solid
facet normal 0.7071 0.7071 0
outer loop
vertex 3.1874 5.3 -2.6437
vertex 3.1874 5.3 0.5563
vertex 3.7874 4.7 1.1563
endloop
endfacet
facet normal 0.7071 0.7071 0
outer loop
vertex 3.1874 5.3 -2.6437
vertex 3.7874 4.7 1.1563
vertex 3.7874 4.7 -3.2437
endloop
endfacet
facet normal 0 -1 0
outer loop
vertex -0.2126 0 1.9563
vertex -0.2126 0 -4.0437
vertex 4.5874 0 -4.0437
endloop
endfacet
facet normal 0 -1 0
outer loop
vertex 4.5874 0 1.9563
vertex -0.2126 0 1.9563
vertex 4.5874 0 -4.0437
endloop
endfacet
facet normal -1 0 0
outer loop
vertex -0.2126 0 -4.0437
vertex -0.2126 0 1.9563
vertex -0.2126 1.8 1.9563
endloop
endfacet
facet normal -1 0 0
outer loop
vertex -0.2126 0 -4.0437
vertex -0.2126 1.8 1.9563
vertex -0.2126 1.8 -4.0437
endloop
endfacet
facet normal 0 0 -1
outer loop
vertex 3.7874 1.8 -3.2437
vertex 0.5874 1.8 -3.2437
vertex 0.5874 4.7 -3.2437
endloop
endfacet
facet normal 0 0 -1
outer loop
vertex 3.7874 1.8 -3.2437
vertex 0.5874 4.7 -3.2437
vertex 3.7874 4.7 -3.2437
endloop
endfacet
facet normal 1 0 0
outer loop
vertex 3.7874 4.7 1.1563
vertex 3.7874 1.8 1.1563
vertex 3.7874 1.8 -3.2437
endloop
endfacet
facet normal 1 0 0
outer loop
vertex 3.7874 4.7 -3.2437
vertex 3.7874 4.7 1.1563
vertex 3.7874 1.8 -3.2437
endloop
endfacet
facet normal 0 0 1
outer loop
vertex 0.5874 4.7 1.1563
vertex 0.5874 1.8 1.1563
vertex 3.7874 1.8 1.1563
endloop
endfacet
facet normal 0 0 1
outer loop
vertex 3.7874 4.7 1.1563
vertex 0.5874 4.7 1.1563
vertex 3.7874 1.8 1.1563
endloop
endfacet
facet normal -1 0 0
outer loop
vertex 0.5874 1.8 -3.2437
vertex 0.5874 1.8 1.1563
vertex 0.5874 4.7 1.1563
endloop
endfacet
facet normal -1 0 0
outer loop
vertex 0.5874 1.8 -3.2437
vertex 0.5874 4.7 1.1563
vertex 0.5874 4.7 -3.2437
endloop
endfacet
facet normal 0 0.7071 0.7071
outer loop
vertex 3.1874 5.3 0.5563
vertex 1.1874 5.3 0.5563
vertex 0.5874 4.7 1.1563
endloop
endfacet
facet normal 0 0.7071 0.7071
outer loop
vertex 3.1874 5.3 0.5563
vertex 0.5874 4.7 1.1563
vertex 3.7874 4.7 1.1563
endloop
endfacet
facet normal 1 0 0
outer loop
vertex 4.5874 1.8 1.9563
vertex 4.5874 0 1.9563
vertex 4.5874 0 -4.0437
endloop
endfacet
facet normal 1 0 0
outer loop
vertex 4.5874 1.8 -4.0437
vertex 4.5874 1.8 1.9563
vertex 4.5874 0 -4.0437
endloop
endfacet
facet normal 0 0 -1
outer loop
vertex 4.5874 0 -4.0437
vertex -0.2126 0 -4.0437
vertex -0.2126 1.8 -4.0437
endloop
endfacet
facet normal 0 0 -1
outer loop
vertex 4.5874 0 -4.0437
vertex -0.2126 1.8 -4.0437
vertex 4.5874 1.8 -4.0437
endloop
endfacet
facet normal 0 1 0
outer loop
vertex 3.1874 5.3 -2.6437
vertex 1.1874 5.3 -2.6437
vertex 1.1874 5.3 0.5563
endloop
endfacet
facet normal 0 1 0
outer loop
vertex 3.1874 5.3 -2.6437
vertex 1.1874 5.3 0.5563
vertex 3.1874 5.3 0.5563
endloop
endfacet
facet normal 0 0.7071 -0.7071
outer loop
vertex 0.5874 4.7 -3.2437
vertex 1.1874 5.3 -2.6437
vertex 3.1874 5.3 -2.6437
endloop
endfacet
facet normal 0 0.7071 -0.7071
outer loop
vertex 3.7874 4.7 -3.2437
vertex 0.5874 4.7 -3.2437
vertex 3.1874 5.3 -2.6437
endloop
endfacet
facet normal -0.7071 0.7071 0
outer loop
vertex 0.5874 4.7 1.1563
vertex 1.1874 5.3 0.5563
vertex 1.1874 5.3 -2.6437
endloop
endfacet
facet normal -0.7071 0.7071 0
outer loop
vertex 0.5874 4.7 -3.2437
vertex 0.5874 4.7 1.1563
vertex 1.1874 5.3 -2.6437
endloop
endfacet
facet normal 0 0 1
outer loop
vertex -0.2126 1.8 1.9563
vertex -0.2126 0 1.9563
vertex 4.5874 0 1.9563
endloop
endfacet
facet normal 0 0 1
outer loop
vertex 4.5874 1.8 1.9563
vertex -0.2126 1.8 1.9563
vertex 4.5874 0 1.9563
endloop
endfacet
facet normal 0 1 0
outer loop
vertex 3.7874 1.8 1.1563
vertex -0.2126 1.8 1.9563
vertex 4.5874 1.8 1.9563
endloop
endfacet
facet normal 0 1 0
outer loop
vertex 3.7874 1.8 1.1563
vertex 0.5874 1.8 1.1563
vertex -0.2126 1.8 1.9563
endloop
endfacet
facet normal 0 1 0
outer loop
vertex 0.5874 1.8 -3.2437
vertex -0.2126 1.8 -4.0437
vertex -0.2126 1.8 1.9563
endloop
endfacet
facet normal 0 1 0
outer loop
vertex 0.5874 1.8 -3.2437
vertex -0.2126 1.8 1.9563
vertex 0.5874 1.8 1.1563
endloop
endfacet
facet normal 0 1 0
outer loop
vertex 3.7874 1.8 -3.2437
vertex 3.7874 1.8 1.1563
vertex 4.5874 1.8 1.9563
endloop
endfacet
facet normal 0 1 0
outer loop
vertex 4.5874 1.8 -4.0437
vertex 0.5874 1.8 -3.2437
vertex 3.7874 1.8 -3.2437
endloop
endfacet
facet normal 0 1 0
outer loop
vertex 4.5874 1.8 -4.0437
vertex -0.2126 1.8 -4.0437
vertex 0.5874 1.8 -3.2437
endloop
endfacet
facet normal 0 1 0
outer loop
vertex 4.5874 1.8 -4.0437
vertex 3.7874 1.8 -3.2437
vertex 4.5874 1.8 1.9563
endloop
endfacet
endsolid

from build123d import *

# Parameters (mm, degrees)
SKETCH_1_W      = 4.8
SKETCH_1_H      = 6
EXTRUDE_1_DEPTH = 1.8
SKETCH_2_W      = 3.2
SKETCH_2_H      = 4.4
EXTRUDE_2_DEPTH = 3.5
CHAMFER_1_SIZE  = 0.6


with BuildPart() as part:
    # 草图1 → 凸台-拉伸1 (new body)
    with BuildSketch(Plane(origin=(0, 0, 0), x_dir=(1, 0, 0), z_dir=(0, 1, 0))):
        with Locations((2.187378641, 1.04368932)):
            Rectangle(SKETCH_1_W, SKETCH_1_H)
    extrude(amount=EXTRUDE_1_DEPTH)

    # 草图2 → 凸台-拉伸2 (add)
    with BuildSketch(Plane(origin=(0, 1.8, 0), x_dir=(1, 0, 0), z_dir=(0, 1, 0))):
        with Locations((2.187378641, 1.04368932)):
            Rectangle(SKETCH_2_W, SKETCH_2_H)
    extrude(amount=EXTRUDE_2_DEPTH)

    # 倒角1
    chamfer_1_edges = [part.edges().sort_by_distance(p)[0] for p in [
        (2.187378641, 5.3, -3.24368932),
        (0.587378641, 5.3, -1.04368932),
        (2.187378641, 5.3, 1.15631068),
        (3.787378641, 5.3, -1.04368932),
    ]]
    chamfer(chamfer_1_edges, length=CHAMFER_1_SIZE)


solid = part.part
